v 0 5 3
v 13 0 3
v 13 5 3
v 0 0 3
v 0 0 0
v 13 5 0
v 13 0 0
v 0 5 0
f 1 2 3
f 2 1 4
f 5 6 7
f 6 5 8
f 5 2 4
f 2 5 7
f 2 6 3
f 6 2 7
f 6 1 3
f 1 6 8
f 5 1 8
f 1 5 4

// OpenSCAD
// Generated by SolidPython 1.0.1 on 2020-07-29 00:46:55


cube(size = [13, 5, 3]);
/***********************************************
*********      SolidPython code:      **********
************************************************
 
# import packages: SolidPython
from solid import *
from solid.utils import *
from itertools import chain, combinations, permutations


class Resize:

    def __init__(self, scad_file):
        self.scad_file = scad_file
        #self.scad_file = import_scad(scad_file)
        # cone/cylinder param:
        self.r1 = 0
        self.r2 = 0
        self.h = 0
        # rectangular prism param:
        self.w = 0
        self.l = 0
        # ellipse param:
        self.r = 0

    # import OpenScad code (file name corresponds to shape)


    # classify shape + parameters
    def assign(self, param1, param2, param3):
        if self.scad_file == 'cone.scad':
            self.r1 = param1
            self.r2 = param2
            self.h = param3
        elif self.scad_file == 'cylinder.scad':
            self.r1 = param1
            self.r2 = param2
            self.h = param3
        elif self.scad_file == 'rectangularPrism.scad':
            self.h = param1
            self.l = param2
            self.w = param3
        else:
            self.r = param1
            self.h = param2

    # resize parameters
    def iterate(self):
        x = range(3, 20, 2)
        i = 1
        if self.scad_file == 'cone.scad':
            tempList = list(permutations(x, 2))
            for temp in tempList:
                param1 = temp[0]
                param2 = temp[1]
                filepath = 'produced_scad_files/' + 'cone' + str(param1) + '_' + str(param2) + '_' + '.scad'
                scad_render_to_file(cylinder(h=param1, r1=param2, r2=0), filepath)

        elif self.scad_file == 'cylinder.scad':
            tempList = list(permutations(x, 3))
            for temp in tempList:
                param1 = temp[0]
                param2 = temp[1]
                filepath = 'produced_scad_files/' + 'cylinder' + str(param1) + '_' + str(param2) + '_' + '.scad'
                scad_render_to_file(cylinder(h=param1, r1=param2, r2=param2), filepath)

        elif self.scad_file == 'rectangularPrism.scad':
            tempList = list(permutations(x, 3))
            for temp in tempList:
                param1 = temp[0]
                param2 = temp[1]
                param3 = temp[2]
                filepath = 'produced_scad_files/' + 'rectangularPrism' + str(param1) + '_' + str(param2) + '_' + str(
                    param3) + '.scad'
                scad_render_to_file(cube(size=(param1, param2, param3)), filepath)

        elif self.scad_file == 'ellipse.scad':
            tempList = list(permutations(x, 4))
            for temp in tempList:
                param1 = temp[0]
                param2 = temp[1]
                param3 = temp[2]
                param4 = temp[3]
                filepath = 'produced_scad_files/' + 'ellipse' + str(param1) + '_' + str(param2) + '_' + str(param3) + '_' + str(param4) + '.scad'
                scad_render_to_file(scale([param1, param2, param3])(sphere(r=param4)), filepath)

    def render_to_scadfile(self):
        scad_render_to_file(scad, 'example.scad') 
 
************************************************/
